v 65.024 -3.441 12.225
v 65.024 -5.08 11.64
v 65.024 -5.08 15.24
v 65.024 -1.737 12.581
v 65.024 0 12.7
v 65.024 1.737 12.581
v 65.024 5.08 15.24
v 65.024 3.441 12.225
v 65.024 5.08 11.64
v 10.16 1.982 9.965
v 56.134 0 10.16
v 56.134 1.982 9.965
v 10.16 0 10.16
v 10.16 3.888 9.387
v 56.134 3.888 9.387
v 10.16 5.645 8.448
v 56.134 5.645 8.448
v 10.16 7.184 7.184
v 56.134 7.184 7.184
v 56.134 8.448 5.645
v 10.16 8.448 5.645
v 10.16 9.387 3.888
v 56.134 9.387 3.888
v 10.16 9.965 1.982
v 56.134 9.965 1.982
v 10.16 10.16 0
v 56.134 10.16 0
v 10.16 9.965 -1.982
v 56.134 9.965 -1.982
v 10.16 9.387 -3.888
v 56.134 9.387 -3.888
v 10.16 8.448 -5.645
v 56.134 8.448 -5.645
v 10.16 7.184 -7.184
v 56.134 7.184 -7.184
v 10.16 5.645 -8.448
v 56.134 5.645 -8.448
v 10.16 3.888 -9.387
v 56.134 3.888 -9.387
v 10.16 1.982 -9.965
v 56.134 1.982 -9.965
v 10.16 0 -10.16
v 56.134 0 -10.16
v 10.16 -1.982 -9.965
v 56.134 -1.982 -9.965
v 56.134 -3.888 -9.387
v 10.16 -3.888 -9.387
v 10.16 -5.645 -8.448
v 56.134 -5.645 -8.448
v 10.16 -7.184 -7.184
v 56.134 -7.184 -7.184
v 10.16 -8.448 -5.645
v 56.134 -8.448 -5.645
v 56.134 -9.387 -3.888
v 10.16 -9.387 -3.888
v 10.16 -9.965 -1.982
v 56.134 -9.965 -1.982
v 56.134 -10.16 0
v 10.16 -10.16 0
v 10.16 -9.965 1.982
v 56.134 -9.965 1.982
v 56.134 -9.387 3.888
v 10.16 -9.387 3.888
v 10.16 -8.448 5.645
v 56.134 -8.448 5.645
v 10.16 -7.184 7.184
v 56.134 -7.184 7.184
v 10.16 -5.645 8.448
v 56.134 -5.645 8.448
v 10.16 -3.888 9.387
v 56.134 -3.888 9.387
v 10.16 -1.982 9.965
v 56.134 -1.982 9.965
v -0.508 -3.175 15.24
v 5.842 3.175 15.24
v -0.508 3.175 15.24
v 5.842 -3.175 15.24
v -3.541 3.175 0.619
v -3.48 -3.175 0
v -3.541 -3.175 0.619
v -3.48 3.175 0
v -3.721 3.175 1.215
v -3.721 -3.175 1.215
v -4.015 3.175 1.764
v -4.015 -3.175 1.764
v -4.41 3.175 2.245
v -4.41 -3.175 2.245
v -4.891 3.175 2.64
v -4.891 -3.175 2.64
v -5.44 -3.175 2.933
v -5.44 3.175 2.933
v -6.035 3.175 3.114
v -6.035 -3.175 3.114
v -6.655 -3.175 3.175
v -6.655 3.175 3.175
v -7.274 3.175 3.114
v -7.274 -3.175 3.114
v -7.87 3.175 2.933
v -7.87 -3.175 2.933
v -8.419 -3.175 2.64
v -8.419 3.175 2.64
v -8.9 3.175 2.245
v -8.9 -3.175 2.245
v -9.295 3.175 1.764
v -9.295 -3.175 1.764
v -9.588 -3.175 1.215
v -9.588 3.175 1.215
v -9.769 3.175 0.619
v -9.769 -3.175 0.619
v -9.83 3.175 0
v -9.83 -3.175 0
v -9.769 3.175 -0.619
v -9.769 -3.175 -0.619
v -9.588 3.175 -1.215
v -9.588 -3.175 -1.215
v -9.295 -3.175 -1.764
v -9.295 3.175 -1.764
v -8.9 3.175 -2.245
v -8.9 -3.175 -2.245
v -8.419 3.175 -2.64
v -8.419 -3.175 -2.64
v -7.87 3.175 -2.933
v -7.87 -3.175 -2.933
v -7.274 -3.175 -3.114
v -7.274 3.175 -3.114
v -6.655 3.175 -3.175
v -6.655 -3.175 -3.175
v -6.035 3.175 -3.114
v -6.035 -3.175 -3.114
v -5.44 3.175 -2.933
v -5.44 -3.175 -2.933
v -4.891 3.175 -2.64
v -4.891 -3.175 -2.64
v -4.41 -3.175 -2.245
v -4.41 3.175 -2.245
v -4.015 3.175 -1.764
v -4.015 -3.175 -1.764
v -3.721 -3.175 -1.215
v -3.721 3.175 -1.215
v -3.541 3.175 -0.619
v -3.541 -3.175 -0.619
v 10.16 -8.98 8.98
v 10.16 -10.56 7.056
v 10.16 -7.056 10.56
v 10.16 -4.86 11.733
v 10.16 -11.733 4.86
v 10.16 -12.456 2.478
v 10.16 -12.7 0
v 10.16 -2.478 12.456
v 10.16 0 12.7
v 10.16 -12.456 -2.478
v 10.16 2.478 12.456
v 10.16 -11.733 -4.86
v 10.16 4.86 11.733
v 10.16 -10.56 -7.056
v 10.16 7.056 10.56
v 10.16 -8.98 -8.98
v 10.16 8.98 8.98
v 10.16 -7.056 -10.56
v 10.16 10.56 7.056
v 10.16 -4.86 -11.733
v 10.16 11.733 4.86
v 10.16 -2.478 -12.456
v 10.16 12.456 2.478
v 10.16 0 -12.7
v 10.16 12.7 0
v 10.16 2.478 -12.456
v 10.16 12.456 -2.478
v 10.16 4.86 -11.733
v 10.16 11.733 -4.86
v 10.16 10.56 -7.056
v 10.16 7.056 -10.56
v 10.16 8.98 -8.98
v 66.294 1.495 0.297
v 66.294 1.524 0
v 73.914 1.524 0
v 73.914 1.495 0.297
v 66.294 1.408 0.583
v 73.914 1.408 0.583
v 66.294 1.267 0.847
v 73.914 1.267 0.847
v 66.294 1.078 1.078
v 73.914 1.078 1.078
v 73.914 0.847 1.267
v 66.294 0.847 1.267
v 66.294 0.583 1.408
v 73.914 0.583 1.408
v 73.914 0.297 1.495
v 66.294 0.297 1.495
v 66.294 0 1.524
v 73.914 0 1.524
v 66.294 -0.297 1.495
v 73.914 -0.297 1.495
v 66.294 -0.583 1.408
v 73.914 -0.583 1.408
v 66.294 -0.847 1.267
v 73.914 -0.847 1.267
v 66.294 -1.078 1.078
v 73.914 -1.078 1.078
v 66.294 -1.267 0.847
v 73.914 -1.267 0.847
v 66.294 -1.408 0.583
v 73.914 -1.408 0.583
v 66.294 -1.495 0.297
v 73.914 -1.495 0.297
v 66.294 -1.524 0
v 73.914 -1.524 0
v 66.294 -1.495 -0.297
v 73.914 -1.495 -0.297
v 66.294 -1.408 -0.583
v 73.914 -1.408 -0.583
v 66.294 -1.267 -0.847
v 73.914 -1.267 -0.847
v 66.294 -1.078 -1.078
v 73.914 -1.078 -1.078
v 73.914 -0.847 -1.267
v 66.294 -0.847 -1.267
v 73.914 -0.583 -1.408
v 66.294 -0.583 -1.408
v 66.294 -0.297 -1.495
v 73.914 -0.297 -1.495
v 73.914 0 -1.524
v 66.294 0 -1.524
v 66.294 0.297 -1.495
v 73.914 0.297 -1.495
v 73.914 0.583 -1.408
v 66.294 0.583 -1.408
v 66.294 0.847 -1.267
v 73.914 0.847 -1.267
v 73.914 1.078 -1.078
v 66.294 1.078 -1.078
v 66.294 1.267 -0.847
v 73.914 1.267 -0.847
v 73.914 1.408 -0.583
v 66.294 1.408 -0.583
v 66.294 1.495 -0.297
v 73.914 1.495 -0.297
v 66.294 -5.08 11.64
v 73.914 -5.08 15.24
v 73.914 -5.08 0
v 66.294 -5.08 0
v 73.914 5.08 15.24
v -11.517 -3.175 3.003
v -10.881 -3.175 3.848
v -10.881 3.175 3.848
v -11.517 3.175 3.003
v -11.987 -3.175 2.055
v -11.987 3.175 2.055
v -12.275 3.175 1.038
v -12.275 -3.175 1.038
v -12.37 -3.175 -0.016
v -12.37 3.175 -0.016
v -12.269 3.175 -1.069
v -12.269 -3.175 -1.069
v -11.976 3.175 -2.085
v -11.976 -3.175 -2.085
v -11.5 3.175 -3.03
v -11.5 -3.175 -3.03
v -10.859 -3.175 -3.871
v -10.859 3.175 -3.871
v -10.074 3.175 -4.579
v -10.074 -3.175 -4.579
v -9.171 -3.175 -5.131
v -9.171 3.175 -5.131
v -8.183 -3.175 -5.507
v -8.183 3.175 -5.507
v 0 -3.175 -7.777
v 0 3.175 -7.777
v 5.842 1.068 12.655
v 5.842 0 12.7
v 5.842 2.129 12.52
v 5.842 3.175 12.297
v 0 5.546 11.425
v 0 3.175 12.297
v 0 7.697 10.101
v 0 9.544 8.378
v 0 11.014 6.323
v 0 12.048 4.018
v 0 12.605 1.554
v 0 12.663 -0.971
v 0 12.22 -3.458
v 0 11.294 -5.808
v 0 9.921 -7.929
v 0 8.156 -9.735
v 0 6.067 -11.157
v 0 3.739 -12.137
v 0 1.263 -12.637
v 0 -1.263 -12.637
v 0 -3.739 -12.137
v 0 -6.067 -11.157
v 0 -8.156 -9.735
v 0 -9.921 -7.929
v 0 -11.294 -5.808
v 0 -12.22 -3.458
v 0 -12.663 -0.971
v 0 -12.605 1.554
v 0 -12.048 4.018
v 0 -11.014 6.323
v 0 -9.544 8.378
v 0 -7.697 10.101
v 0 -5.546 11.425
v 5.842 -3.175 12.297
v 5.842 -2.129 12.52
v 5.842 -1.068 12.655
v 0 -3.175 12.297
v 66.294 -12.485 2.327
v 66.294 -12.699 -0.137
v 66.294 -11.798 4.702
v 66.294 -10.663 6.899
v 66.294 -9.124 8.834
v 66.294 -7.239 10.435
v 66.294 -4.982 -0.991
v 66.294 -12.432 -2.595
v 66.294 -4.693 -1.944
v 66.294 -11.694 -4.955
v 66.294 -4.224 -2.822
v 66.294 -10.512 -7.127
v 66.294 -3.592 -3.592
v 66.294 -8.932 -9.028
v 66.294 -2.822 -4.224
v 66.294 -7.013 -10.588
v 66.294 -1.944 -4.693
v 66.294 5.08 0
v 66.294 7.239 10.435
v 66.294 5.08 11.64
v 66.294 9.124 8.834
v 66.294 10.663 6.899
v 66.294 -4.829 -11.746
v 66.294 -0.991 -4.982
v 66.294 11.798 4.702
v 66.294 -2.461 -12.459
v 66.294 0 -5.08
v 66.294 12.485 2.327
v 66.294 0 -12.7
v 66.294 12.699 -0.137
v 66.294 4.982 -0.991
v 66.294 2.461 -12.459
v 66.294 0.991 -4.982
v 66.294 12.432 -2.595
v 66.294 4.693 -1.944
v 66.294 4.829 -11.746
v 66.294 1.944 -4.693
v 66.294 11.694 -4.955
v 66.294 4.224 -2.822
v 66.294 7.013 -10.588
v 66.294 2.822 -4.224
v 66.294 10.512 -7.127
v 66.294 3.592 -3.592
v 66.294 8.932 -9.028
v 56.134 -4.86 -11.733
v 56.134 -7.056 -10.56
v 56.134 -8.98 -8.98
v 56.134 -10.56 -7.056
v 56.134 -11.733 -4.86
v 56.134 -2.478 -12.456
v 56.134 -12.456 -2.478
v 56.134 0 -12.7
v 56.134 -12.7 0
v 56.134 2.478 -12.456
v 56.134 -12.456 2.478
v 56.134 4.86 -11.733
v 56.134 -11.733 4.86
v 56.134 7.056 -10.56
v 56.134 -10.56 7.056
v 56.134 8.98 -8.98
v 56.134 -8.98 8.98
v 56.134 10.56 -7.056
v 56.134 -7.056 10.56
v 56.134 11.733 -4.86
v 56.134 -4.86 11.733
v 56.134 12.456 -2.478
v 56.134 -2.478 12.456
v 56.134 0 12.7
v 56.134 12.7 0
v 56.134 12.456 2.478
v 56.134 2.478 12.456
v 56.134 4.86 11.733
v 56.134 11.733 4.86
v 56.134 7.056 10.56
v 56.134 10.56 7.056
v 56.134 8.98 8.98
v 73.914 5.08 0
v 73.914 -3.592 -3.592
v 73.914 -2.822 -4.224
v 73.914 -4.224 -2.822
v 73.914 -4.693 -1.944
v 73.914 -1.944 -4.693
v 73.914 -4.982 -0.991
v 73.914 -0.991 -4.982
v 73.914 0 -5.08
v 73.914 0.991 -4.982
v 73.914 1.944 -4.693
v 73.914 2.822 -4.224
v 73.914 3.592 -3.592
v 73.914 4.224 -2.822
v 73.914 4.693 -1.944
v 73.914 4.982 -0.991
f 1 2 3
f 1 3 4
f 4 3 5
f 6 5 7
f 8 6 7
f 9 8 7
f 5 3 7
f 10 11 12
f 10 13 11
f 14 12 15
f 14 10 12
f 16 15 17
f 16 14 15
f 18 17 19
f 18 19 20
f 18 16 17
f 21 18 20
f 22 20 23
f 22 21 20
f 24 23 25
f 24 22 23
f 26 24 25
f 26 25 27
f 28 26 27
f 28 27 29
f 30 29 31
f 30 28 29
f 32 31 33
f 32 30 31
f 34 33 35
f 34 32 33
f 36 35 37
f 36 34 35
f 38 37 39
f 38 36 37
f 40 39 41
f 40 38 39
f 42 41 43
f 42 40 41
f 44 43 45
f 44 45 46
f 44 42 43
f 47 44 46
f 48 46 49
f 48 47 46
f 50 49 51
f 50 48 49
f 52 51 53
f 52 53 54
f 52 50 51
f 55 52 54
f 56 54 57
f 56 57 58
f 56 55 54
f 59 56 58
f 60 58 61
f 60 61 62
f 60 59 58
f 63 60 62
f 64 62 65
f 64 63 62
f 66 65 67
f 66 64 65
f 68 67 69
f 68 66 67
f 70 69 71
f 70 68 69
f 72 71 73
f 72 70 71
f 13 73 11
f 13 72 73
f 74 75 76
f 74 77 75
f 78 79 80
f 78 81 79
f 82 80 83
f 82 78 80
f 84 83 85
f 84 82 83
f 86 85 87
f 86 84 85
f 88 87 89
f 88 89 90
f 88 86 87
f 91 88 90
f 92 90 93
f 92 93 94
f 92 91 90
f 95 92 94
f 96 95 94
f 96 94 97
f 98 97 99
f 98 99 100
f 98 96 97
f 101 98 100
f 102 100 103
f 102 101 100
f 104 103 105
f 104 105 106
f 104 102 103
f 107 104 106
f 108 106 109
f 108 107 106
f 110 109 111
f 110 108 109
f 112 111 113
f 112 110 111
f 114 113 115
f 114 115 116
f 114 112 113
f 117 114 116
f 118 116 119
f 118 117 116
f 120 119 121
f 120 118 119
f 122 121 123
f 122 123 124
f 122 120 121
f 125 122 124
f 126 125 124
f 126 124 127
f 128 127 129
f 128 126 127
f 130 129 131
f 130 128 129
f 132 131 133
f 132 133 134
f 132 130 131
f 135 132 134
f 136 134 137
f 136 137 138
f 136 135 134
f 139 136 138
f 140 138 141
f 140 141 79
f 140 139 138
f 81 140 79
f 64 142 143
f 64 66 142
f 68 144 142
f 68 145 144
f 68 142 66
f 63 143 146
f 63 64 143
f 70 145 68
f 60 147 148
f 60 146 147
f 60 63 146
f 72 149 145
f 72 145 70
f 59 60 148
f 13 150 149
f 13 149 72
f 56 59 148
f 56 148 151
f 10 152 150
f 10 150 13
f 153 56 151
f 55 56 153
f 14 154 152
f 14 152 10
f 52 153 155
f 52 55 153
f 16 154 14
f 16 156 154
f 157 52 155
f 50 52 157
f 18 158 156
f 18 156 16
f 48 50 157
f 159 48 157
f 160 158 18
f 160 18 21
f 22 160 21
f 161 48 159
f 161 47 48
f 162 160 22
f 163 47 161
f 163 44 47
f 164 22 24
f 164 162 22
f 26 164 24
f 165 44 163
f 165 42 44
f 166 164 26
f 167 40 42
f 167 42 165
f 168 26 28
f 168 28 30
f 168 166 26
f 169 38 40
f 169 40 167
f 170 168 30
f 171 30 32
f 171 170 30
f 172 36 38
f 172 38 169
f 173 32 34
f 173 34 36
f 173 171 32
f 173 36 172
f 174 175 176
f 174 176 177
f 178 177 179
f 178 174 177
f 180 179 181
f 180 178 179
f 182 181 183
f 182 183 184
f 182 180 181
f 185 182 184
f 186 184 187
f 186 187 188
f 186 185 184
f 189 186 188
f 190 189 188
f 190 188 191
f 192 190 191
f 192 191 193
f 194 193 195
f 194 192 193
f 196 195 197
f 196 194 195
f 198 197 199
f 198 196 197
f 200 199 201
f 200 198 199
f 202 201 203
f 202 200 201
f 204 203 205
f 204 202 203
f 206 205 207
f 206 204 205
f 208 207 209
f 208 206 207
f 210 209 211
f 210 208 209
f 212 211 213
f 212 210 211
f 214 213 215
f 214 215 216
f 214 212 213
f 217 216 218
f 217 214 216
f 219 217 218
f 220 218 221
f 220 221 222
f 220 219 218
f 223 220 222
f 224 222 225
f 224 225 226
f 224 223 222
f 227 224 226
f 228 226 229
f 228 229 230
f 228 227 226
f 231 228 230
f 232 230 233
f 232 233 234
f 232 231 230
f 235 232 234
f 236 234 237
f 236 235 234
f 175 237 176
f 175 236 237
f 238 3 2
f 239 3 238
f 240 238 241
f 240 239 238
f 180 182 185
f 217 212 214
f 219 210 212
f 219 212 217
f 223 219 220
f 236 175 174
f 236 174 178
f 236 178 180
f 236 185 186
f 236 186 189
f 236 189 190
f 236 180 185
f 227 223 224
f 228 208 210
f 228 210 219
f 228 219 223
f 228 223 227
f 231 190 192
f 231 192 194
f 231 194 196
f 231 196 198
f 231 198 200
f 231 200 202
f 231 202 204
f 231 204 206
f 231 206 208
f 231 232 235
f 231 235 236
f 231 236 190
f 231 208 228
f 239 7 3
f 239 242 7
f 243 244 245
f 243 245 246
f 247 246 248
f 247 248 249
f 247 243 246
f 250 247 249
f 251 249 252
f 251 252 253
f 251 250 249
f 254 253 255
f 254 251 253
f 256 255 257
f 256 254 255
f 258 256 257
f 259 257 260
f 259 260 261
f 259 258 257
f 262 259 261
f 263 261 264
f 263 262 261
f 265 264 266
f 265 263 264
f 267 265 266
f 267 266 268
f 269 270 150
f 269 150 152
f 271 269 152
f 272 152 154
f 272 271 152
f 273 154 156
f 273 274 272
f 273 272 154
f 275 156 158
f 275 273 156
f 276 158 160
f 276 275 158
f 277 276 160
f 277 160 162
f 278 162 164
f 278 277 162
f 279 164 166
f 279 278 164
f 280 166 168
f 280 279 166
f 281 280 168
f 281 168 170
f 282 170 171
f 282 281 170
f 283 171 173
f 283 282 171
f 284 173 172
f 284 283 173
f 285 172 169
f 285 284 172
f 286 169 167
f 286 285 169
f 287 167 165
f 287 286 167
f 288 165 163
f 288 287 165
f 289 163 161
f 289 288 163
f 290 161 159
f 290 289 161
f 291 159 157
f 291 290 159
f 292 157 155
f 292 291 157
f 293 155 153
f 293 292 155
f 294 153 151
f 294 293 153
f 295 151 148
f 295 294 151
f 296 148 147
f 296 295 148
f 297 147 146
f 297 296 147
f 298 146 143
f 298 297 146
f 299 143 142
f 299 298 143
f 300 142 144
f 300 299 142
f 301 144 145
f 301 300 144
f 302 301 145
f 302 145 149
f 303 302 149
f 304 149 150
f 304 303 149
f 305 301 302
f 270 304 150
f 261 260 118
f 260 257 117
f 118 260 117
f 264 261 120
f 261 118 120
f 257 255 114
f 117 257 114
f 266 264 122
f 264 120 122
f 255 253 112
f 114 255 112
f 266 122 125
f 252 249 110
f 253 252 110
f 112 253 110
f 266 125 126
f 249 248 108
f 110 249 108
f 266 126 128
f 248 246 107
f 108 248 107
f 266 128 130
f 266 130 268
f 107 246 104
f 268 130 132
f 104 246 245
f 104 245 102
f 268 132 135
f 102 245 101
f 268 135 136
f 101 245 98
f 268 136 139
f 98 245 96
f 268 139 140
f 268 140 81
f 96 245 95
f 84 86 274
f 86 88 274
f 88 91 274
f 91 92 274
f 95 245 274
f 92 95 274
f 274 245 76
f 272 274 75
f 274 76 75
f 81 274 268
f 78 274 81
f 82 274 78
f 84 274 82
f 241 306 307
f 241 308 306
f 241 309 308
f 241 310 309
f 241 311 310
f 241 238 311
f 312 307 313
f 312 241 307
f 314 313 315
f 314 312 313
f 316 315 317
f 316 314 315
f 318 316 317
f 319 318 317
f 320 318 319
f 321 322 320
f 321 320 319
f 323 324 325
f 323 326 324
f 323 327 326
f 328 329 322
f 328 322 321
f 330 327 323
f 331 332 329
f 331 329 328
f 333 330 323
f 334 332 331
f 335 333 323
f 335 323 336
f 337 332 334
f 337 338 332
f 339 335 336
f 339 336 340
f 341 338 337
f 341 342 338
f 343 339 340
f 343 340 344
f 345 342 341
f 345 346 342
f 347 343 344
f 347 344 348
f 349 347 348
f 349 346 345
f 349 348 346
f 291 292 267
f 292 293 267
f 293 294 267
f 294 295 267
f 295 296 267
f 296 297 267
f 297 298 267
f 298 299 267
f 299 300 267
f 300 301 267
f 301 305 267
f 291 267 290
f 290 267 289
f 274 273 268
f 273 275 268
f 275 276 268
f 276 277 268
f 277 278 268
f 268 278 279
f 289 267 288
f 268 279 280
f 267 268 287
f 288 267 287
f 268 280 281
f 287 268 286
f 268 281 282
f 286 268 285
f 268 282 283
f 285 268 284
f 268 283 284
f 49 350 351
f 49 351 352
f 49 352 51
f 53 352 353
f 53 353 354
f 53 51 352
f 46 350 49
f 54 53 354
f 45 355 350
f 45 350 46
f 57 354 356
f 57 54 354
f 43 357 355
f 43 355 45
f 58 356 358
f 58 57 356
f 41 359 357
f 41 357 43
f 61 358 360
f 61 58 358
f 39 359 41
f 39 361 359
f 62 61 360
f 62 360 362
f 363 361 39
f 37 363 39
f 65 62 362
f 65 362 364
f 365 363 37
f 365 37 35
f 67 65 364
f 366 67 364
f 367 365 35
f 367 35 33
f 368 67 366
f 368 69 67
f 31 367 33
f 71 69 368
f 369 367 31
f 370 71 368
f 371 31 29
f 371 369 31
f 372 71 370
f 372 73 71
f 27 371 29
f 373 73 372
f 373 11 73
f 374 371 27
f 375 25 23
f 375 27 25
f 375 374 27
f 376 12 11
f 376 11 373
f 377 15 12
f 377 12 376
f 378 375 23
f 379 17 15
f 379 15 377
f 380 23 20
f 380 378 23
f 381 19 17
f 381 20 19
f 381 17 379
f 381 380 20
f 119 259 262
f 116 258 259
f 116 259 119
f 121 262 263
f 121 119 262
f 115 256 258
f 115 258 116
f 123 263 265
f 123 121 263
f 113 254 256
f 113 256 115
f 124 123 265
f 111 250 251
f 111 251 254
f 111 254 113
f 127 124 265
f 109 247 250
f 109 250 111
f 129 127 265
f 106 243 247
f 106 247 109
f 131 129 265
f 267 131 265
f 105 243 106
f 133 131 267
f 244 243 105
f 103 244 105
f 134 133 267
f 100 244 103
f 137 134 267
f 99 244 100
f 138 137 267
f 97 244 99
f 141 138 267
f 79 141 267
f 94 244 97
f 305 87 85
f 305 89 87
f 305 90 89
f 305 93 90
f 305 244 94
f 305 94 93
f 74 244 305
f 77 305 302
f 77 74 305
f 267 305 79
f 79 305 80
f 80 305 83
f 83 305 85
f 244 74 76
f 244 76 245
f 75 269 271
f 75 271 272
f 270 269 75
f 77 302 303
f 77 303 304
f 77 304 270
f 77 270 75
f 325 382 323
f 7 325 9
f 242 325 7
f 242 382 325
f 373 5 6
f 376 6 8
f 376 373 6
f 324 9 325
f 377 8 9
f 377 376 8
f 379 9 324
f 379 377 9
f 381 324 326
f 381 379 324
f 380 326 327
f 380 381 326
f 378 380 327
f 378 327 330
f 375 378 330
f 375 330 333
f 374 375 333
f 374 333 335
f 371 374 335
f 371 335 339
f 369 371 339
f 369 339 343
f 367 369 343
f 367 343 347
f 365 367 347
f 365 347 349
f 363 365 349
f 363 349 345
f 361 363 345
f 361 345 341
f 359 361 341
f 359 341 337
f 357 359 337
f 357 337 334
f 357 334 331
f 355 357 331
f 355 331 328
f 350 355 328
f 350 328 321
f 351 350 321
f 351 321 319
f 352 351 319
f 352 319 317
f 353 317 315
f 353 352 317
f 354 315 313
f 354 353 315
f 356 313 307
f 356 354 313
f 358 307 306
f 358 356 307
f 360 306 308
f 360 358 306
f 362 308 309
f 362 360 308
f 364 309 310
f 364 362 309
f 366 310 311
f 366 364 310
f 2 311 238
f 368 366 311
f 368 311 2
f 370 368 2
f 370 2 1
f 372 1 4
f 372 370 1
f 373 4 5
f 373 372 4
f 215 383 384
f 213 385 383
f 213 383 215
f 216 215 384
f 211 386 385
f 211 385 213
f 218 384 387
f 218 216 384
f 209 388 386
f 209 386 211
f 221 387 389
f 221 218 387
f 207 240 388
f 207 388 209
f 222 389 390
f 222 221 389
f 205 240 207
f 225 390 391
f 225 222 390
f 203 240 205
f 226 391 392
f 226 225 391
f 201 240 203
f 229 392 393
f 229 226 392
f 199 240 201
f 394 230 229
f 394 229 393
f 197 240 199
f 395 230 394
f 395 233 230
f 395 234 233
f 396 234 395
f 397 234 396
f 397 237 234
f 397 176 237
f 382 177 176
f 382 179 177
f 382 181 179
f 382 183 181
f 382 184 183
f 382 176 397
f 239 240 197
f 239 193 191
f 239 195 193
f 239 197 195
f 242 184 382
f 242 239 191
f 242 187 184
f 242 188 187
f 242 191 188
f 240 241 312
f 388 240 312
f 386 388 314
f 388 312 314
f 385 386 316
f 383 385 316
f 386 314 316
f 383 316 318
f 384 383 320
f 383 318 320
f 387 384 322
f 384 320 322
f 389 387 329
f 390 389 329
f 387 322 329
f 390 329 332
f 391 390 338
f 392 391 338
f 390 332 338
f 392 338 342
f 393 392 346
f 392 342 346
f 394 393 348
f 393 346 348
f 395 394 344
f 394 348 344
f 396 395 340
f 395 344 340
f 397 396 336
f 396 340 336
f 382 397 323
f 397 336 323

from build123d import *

# Parameters (mm, degrees)
F0_W          = 5.842
F0_H          = 12.7
F0_R          = 3.175
F2_DEPTH      = 3.175
F3_R          = 1.524
F4_DEPTH      = 7.62
F4_DEPTH_BACK = 1.27
F5_DEPTH      = 56.134


with BuildPart() as f1:
    # F0 (on Front) → F1 (revolve)
    with BuildSketch(Plane.XZ):
        Polygon((5.842, 12.7), (5.842, 0), (66.294, 0), (66.294, 12.7), (56.134, 12.7), (56.134, 10.16), (10.16, 10.16), (10.16, 12.7), align=None)
        with Locations((2.921, 6.35)):
            Rectangle(F0_W, F0_H)
    revolve(axis=Axis((33.147, 0, 0), (-1, 0, 0)))

    # F0 (on Front) → F2 (join, symmetric)
    with BuildSketch(Plane.XZ):
        with Locations((2.921, 6.35)):
            Rectangle(F0_W, F0_H)
        with BuildLine():
            Line((-0.9398, 0), (0, 0))
            Line((0, 0), (0, 12.7))
            Line((0, 12.7), (5.842, 12.7))
            Line((5.842, 12.7), (5.842, 15.24))
            Line((5.842, 15.24), (-0.508, 15.24))
            Line((-0.508, 15.24), (-10.8806298187, 3.8475430269))
            ThreePointArc((-10.8806298187, 3.8475430269), (-4.5919612295, 5.3297205562), (-0.9398, 0))
        make_face()
        with BuildLine():
            Line((5.842, 0), (0, 0))
            Line((0, 0), (-0.9398, 0))
            ThreePointArc((-0.9398, 0), (-3.1957909266, -4.5493385486), (-8.1826630726, -5.5069827884))
            Line((-8.1826630726, -5.5069827884), (5.842, -9.398))
            Line((5.842, -9.398), (5.842, 0))
        make_face()
        with BuildLine():
            ThreePointArc((-8.1826630726, -5.5069827884), (-3.1957909266, -4.5493385486), (-0.9398, 0))
            ThreePointArc((-0.9398, 0), (-4.5919612295, 5.3297205562), (-10.8806298187, 3.8475430269))
            ThreePointArc((-10.8806298187, 3.8475430269), (-12.1459778134, -1.5837270034), (-8.1826630726, -5.5069827884))
        make_face()
        with Locations((-6.6548, 0)):
            Circle(F0_R, mode=Mode.SUBTRACT)
    extrude(amount=F2_DEPTH, both=True)

    # F3 (on face) → F4 (join, two sides)
    with BuildSketch(Plane.YZ.offset(66.294)) as f4_sk:
        with BuildLine():
            ThreePointArc((-5.08, 0), (0, -5.08), (5.08, 0))
            ThreePointArc((5.08, 0), (0, 5.08), (-5.08, 0))
        make_face()
        Circle(F3_R, mode=Mode.SUBTRACT)
        with BuildLine():
            ThreePointArc((-5.08, 0), (0, 5.08), (5.08, 0))
            Line((5.08, 0), (5.08, 15.24))
            Line((5.08, 15.24), (-5.08, 15.24))
            Line((-5.08, 15.24), (-5.08, 0))
        make_face()
    extrude(amount=F4_DEPTH)
    extrude(f4_sk.sketch, amount=-F4_DEPTH_BACK)

    # F5 (add, through all): a face of the model
    f5_faces = [f1.faces().sort_by_distance(p)[0] for p in [
        (66.294, 0, 0),
    ]]
    extrude(f5_faces, amount=-F5_DEPTH)


solid = f1.part
